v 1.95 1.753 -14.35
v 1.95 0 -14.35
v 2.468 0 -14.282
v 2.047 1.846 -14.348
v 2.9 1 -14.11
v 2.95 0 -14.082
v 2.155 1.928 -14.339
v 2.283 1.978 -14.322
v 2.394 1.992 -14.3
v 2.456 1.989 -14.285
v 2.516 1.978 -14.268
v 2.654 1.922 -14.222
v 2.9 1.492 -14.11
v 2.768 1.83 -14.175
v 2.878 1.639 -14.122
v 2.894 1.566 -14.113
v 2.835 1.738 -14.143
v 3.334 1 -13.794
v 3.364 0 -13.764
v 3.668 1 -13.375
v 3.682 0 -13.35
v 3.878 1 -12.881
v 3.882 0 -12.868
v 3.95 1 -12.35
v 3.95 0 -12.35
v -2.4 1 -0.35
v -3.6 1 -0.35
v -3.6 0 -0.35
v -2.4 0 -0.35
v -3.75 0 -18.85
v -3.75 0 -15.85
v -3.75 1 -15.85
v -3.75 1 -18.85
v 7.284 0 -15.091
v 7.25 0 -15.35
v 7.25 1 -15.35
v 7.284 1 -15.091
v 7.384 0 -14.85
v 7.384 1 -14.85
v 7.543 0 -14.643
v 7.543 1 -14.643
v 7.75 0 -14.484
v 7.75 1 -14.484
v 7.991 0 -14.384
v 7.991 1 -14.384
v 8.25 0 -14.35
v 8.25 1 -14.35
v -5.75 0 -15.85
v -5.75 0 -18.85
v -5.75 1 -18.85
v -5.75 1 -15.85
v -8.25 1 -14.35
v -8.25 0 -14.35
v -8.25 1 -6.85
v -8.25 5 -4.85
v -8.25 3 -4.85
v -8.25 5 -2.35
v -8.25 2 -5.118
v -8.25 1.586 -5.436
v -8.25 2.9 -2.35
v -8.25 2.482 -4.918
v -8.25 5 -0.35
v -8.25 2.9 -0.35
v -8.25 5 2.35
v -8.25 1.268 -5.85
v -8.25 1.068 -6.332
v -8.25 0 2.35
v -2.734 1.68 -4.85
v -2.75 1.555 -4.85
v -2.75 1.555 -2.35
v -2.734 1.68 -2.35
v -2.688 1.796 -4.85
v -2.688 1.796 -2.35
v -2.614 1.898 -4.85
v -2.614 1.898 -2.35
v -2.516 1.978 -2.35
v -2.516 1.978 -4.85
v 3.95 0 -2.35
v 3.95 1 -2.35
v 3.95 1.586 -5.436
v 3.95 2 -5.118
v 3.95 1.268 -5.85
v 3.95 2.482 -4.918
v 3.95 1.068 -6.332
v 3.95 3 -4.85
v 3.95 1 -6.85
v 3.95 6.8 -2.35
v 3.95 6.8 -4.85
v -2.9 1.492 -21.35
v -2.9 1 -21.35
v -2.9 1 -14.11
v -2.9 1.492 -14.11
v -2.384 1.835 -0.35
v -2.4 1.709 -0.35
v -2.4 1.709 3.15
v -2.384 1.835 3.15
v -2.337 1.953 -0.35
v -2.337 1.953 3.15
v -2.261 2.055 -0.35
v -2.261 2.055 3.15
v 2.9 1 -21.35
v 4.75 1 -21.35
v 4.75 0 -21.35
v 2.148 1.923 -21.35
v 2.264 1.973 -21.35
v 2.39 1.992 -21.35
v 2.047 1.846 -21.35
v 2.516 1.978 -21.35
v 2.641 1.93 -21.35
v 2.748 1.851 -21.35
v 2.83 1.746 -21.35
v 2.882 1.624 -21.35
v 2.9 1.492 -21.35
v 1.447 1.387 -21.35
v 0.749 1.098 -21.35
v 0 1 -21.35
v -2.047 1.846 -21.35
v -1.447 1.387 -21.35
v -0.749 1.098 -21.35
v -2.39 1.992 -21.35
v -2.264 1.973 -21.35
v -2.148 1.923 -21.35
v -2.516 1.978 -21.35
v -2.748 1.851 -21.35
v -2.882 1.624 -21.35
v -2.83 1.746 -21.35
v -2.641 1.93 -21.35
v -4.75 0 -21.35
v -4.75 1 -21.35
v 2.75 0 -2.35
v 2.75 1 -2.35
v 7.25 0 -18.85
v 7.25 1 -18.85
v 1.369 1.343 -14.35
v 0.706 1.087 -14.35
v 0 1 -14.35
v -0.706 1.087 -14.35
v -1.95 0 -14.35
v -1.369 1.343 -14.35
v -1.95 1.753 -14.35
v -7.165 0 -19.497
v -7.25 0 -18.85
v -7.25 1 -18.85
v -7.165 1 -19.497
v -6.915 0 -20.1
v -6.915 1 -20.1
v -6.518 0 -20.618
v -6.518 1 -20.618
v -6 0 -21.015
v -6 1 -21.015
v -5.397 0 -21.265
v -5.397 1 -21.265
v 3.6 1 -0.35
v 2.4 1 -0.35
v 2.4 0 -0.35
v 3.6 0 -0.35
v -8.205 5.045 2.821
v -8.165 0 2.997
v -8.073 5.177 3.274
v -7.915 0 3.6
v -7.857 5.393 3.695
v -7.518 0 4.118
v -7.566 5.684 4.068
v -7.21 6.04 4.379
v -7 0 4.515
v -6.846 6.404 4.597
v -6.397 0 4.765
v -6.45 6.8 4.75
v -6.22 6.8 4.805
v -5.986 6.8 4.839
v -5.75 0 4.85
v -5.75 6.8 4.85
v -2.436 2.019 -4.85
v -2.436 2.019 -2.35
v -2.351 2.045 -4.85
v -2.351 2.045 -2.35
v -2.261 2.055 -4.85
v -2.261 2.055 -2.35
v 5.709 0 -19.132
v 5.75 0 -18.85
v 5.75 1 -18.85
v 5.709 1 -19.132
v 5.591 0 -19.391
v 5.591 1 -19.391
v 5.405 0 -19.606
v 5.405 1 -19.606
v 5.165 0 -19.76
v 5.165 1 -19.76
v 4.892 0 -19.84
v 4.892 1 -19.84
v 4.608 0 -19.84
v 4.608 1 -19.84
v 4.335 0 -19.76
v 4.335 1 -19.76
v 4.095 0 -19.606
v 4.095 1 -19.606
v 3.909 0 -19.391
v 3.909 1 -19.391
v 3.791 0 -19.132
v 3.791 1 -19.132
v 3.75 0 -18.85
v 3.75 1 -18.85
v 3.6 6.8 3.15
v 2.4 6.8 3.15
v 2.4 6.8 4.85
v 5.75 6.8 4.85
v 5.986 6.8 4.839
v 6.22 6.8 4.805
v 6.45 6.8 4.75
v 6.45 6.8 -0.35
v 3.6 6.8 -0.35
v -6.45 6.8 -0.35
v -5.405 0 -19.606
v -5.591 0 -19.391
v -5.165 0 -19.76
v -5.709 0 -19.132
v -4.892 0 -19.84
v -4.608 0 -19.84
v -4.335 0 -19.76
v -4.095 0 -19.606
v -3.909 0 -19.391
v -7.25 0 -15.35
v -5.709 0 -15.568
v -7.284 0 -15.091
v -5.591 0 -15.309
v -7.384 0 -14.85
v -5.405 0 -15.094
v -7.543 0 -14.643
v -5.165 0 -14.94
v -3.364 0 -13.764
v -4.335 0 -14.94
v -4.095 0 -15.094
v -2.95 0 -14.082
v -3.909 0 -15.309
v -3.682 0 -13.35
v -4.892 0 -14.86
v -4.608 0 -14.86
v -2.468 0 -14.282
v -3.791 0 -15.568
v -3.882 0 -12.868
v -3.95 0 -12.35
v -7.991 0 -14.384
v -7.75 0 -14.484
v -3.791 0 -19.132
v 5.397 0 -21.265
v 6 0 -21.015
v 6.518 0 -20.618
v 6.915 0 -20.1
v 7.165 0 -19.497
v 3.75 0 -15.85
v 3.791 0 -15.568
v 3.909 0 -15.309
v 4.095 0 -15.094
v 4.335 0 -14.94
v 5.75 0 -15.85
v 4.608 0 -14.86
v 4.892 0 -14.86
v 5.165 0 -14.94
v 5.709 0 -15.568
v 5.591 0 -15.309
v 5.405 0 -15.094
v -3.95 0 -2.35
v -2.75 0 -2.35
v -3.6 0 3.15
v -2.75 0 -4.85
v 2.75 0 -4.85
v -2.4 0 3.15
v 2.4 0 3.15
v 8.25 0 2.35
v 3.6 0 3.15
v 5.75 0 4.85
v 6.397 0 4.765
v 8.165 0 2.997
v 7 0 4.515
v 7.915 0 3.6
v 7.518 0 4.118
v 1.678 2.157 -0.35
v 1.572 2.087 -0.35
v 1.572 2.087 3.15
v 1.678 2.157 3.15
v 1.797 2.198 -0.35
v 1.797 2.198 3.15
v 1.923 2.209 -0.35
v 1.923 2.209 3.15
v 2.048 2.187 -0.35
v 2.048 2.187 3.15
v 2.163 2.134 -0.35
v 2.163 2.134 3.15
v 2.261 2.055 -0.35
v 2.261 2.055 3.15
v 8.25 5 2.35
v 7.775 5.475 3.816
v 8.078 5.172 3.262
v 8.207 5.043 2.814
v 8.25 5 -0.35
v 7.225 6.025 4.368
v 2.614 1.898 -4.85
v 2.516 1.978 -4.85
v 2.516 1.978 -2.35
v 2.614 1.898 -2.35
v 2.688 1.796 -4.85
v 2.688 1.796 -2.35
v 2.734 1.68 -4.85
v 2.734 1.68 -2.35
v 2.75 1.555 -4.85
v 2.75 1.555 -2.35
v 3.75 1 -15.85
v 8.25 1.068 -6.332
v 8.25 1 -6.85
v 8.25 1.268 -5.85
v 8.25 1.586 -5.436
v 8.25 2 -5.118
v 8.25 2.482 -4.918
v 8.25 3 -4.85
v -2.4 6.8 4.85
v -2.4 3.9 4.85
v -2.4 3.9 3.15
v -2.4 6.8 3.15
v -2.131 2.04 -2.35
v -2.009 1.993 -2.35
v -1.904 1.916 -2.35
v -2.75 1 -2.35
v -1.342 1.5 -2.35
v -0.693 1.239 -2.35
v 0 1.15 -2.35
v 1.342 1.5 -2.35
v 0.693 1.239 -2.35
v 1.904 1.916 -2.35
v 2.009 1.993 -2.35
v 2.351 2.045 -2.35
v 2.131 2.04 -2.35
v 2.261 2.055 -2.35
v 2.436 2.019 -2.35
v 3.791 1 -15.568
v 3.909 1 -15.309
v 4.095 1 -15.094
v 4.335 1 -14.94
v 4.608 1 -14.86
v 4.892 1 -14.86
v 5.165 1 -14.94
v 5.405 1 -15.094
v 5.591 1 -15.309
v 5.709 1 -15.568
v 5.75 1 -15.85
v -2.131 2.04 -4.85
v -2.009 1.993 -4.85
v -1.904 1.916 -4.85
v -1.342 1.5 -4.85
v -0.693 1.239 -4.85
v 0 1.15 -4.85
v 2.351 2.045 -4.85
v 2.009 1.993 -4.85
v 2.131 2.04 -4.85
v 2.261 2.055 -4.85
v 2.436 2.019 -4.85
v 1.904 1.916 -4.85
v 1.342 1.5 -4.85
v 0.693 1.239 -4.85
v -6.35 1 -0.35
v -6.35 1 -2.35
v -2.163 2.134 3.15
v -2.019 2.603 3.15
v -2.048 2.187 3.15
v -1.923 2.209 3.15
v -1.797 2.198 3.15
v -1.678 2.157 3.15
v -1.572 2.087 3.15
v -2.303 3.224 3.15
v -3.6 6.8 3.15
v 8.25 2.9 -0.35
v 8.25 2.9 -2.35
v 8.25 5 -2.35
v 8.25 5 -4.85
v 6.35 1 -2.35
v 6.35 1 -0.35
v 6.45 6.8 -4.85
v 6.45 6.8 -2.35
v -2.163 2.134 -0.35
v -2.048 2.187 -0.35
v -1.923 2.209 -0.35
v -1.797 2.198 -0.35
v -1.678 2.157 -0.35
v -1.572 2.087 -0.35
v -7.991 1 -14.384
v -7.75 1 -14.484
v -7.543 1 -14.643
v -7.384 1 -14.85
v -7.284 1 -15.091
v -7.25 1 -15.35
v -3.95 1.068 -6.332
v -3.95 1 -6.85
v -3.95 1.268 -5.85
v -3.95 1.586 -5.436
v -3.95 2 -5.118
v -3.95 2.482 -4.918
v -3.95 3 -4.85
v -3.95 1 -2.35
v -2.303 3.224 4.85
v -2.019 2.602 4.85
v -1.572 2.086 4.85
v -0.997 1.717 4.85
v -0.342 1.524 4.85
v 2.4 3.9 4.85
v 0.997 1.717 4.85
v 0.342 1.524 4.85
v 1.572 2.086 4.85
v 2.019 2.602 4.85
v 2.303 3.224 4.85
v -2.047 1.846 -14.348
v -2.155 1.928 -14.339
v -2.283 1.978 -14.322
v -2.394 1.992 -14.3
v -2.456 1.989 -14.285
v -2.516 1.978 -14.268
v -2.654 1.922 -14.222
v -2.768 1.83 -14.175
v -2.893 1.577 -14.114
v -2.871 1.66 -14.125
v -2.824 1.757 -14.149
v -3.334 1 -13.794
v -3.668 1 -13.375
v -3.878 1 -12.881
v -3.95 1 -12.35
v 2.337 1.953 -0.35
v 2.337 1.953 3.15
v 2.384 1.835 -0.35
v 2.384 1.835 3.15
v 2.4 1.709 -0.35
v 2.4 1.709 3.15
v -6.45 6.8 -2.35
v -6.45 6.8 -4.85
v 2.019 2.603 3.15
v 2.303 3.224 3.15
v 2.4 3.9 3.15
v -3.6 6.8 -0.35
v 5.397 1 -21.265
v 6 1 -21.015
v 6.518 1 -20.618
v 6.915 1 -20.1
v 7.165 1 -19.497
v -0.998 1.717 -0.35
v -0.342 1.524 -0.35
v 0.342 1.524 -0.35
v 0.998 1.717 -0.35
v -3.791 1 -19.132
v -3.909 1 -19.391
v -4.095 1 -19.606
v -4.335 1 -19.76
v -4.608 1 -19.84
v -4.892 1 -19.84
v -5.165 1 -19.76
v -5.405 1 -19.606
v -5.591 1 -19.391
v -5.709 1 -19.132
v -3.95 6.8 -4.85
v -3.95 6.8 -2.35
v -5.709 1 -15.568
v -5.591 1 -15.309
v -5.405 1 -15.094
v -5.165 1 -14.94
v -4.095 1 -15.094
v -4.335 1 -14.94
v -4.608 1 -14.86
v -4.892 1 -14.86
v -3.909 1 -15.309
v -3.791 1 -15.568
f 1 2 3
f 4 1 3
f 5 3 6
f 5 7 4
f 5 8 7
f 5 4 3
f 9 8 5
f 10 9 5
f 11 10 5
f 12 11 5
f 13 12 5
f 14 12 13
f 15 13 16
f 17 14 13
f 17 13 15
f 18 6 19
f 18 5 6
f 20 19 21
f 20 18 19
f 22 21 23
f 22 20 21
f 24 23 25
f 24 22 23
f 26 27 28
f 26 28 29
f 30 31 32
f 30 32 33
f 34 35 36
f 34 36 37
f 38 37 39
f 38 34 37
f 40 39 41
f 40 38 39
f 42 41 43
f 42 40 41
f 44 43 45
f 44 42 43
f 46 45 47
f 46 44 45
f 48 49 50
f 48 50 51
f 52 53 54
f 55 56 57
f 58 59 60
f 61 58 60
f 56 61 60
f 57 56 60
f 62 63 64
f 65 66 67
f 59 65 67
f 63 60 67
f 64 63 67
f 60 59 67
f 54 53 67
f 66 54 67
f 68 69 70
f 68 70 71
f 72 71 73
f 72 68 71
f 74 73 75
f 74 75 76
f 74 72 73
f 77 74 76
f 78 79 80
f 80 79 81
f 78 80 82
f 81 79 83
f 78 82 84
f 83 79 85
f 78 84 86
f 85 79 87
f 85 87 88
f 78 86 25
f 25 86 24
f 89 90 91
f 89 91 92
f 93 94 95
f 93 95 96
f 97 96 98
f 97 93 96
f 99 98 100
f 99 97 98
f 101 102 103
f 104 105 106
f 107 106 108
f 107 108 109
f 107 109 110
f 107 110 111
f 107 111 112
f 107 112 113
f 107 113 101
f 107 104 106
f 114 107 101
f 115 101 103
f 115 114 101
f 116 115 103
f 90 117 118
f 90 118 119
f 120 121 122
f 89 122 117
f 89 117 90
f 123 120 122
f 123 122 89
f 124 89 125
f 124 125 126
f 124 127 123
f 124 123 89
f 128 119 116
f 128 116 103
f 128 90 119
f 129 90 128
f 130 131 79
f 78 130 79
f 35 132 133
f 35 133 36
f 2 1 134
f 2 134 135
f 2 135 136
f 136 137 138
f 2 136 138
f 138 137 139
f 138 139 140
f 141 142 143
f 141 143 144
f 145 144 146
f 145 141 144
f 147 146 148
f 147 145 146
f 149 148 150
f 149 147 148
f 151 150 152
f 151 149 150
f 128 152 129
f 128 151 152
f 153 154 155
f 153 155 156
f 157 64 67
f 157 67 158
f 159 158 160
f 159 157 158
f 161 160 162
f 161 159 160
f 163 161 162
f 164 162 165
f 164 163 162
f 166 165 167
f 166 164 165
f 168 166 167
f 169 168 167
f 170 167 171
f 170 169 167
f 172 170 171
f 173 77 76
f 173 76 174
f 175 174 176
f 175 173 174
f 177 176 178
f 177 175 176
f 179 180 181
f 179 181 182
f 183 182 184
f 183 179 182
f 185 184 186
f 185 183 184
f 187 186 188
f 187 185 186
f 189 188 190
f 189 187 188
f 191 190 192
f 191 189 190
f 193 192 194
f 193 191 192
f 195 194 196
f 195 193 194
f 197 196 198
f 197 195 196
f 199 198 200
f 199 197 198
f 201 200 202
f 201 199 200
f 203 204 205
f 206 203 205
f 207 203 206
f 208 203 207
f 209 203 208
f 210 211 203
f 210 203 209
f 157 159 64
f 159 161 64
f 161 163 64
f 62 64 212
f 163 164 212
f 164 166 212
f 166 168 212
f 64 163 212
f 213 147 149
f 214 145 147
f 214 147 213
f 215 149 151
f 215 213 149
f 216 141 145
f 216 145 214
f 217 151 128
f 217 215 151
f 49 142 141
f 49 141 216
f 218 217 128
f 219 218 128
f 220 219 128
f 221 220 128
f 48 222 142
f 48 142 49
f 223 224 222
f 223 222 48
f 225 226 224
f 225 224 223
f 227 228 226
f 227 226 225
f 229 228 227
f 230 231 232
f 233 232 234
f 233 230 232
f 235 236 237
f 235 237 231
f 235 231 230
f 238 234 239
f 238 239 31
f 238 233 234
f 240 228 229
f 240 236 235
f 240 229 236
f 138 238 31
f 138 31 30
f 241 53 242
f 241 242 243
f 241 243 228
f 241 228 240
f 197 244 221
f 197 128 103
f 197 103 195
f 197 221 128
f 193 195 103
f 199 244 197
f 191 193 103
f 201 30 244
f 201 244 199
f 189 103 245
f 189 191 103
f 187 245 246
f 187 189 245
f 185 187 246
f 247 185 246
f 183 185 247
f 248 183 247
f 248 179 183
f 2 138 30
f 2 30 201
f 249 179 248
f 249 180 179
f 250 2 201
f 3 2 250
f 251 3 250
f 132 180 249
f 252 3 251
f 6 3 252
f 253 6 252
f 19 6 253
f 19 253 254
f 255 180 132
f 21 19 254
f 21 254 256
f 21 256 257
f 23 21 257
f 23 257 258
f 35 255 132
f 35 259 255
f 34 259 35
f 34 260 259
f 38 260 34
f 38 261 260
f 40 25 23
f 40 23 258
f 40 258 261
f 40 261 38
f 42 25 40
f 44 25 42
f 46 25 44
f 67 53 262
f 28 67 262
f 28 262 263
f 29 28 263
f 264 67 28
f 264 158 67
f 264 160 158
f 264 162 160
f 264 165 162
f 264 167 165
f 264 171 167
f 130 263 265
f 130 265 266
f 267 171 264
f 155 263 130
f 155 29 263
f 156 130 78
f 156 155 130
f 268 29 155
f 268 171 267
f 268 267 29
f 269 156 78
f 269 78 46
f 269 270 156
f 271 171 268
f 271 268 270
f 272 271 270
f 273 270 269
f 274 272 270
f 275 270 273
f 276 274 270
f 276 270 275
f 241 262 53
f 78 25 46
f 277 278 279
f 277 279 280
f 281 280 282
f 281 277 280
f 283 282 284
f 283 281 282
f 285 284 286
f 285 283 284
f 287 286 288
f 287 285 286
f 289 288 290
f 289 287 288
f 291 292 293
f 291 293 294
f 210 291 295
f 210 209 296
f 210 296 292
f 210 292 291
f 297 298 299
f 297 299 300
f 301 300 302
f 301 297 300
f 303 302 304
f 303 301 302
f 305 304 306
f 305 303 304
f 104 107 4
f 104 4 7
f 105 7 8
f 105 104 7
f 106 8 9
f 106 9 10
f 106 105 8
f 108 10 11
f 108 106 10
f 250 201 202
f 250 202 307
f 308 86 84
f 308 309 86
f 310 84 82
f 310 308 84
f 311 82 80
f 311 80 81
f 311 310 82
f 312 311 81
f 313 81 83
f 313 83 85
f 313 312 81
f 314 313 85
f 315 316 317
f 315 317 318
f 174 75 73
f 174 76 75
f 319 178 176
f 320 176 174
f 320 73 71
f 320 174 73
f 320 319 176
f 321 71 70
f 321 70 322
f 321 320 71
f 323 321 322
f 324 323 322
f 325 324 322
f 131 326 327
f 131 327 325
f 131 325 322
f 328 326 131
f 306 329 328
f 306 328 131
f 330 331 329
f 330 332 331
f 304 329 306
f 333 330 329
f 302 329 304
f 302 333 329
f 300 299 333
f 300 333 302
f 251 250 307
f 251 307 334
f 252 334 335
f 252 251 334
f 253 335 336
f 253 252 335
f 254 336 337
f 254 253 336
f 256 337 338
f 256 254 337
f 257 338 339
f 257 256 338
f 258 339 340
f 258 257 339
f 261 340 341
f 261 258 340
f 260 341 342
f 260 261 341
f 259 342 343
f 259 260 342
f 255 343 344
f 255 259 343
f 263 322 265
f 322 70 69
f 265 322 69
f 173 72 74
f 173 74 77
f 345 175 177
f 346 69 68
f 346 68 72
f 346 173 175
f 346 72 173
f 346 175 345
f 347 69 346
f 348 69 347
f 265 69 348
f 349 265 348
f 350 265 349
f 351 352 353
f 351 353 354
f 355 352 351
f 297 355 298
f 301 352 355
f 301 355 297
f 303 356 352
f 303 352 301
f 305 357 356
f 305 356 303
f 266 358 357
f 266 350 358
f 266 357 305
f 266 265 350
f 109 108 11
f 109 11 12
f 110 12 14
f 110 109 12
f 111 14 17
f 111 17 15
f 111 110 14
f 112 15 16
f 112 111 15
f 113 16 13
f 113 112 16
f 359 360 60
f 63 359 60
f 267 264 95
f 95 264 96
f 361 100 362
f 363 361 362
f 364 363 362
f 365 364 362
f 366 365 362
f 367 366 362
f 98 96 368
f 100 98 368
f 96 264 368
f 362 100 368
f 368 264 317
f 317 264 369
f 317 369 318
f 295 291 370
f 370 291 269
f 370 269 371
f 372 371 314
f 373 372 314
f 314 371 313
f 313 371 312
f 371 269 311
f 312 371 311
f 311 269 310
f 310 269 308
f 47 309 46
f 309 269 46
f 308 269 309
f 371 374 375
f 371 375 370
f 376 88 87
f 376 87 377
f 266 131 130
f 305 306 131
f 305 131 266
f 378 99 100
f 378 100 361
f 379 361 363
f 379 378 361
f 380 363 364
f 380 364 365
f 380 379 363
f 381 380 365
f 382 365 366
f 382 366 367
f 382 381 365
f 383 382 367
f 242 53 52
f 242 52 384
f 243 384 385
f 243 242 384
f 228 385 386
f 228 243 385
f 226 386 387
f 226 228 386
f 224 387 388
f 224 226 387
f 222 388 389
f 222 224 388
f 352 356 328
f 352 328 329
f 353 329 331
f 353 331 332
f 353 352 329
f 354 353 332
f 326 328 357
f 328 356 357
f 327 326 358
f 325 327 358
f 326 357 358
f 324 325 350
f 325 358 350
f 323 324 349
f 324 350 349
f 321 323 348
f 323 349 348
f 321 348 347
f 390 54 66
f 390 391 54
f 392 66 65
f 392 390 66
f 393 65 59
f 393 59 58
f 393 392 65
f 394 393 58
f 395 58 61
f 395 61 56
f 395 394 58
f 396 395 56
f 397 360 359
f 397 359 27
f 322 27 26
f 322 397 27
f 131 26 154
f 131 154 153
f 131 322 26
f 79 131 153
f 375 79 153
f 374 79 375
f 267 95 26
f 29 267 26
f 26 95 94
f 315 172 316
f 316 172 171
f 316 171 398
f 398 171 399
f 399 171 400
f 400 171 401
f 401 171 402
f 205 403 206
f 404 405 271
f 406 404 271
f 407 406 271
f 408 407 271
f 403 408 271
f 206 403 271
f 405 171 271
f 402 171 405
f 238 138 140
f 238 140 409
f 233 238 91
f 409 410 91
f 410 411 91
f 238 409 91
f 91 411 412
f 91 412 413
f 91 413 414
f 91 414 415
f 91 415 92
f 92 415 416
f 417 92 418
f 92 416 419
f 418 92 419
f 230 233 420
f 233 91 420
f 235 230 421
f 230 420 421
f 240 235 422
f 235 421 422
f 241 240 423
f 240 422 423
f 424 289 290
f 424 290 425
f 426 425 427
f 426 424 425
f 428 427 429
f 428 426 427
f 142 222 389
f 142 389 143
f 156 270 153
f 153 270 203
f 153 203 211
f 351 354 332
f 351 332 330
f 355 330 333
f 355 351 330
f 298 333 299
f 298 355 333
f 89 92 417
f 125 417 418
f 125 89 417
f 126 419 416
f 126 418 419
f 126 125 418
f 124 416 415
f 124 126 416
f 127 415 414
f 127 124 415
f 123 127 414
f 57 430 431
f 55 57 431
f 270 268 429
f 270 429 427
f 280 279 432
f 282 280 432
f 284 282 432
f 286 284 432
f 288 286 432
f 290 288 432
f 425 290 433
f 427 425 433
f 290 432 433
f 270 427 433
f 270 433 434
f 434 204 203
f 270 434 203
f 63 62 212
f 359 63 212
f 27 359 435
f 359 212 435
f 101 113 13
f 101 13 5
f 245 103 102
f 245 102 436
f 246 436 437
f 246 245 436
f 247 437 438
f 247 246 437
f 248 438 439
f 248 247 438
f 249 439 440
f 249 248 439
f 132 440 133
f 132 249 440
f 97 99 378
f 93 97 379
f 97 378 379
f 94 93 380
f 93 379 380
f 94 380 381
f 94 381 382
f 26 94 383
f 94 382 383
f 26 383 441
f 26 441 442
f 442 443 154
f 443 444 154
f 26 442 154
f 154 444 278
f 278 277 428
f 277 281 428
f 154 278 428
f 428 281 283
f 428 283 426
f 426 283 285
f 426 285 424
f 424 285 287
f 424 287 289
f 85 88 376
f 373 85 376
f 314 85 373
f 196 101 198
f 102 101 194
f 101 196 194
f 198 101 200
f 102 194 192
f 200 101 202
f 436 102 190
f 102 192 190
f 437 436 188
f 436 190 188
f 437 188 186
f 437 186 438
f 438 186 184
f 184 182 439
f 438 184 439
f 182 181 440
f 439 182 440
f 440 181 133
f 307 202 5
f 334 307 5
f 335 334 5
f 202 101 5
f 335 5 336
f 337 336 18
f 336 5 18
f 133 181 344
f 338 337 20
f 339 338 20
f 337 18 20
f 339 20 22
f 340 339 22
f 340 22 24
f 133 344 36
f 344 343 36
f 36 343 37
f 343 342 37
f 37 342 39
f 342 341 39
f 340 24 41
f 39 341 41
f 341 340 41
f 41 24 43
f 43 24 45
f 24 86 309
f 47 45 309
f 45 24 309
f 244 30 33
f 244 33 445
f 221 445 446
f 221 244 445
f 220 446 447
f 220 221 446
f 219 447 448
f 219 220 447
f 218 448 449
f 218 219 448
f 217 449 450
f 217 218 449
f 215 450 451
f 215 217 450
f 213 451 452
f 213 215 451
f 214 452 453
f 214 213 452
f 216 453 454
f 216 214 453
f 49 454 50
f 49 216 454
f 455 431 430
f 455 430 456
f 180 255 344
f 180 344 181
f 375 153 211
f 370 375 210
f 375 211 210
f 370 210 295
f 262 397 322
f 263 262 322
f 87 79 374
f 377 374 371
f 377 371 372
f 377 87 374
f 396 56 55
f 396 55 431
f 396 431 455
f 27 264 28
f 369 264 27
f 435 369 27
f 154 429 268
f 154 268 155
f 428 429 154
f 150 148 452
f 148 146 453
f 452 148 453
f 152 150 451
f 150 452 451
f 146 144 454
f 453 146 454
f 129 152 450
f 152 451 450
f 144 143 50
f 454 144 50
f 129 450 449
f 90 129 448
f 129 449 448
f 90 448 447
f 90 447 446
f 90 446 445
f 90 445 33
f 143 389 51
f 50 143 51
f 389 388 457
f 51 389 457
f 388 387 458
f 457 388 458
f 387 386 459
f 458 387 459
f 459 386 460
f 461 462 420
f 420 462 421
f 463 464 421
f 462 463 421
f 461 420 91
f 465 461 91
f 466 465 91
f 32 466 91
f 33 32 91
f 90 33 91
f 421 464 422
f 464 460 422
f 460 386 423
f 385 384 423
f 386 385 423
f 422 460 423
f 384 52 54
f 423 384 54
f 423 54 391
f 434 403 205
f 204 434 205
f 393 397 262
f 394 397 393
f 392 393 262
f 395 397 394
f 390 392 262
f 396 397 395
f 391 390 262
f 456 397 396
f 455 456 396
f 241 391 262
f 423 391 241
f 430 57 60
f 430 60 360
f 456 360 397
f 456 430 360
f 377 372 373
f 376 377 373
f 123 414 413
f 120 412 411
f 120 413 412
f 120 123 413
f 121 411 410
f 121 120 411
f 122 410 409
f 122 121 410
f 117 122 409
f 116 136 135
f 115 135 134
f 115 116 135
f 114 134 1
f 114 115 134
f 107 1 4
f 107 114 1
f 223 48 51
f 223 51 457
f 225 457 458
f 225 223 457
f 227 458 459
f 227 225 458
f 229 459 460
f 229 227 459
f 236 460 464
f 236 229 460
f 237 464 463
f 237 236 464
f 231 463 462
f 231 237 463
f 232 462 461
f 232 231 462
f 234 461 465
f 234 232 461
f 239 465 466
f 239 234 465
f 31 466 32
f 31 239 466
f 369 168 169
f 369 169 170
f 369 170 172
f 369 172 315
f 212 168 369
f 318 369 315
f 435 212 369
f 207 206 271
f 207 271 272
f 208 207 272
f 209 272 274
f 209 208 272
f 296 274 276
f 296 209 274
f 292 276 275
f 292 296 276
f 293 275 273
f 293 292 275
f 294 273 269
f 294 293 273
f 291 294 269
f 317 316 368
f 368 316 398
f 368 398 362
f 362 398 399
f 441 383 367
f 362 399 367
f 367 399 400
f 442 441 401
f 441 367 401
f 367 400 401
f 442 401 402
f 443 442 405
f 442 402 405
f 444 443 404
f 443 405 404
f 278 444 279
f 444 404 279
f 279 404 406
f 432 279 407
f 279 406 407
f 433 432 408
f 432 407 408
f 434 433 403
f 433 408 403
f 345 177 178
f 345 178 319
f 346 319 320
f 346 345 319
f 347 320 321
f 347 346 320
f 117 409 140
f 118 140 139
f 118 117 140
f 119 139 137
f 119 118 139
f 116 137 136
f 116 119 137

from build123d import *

# Parameters (mm, degrees)
SKETCH1_W           = 16.5
SKETCH1_H           = 9.7
BOSS_EXTRUDE1_DEPTH = 6.8
SKETCH2_W           = 16.5
SKETCH2_H           = 2
CUT_EXTRUDE1_DEPTH  = 5.8
CUT_EXTRUDE2_REACH  = 16.436
SKETCH3_R           = 2.75
CUT_EXTRUDE3_REACH  = 16.436
SKETCH4_R           = 2.4
SKETCH4_W           = 4.8
SKETCH4_H           = 2.9
SKETCH5_W           = 1.2
SKETCH5_H           = 2.5
SKETCH5_H_2         = 3.5
CUT_EXTRUDE4_DEPTH  = 12.739889267
BOSS_EXTRUDE2_DEPTH = 2
CHAMFER1_SIZE       = 1.8
FILLET4_R           = 2.5
SKETCH8_W           = 2.5
SKETCH8_H           = 9.5
SKETCH8_W_2         = 1.8
BOSS_EXTRUDE3_DEPTH = 1
BOSS_EXTRUDE5_DEPTH = 7
FILLET1_START       = -22
FILLET1_DEPTH       = 25.15
FILLET1_2_DEPTH     = 7.65
FILLET1_START_2     = -14.35
FILLET1_3_DEPTH     = 12
FILLET1_START_3     = -0.35
FILLET1_4_DEPTH     = 3.5
FILLET5_R           = 2


with BuildPart() as part:
    # Sketch1 → Boss-Extrude1 (new body)
    with BuildSketch(Plane(origin=(0, 0, 0), x_dir=(1, 0, 0), z_dir=(0, 1, 0))):
        Rectangle(SKETCH1_W, SKETCH1_H)
    extrude(amount=BOSS_EXTRUDE1_DEPTH)

    # Sketch2 → Cut-Extrude1 (cut)
    with BuildSketch(Plane(origin=(0, 6.8, 0), x_dir=(1, 0, 0), z_dir=(0, 1, 0))):
        with Locations((0, 1.35)):
            Rectangle(SKETCH2_W, SKETCH2_H)
    extrude(amount=-CUT_EXTRUDE1_DEPTH, mode=Mode.SUBTRACT)

    # Sketch3 → Cut-Extrude2 (cut, up to next)
    with BuildSketch(Plane(origin=(0, 0, -4.85), x_dir=(-1, 0, 0), z_dir=(0, 0, -1)), mode=Mode.PRIVATE) as cut_extrude2_sk1:
        with Locations((0, 3.9)):
            Circle(SKETCH3_R)
    cut_extrude2_tool1 = extrude(cut_extrude2_sk1.sketch, amount=-CUT_EXTRUDE2_REACH, mode=Mode.PRIVATE) & part.part
    # Sketch3 → Cut-Extrude2 (cut, up to next)
    with BuildSketch(Plane(origin=(0, 0, -4.85), x_dir=(-1, 0, 0), z_dir=(0, 0, -1)), mode=Mode.PRIVATE) as cut_extrude2_sk2:
        with BuildLine():
            Line((-2.75, 6.8), (-2.75, 3.9))
            ThreePointArc((-2.75, 3.9), (0, 6.65), (2.75, 3.9))
            Line((2.75, 3.9), (2.75, 6.8))
            Line((2.75, 6.8), (-2.75, 6.8))
        make_face()
    cut_extrude2_tool2 = extrude(cut_extrude2_sk2.sketch, amount=-CUT_EXTRUDE2_REACH, mode=Mode.PRIVATE) & part.part
    add(cut_extrude2_tool1.solids().sort_by_distance((0, 3.9, -4.85))[0], mode=Mode.SUBTRACT)
    add(cut_extrude2_tool2.solids().sort_by_distance((2.687823, 5.35, -4.85))[0], mode=Mode.SUBTRACT)

    # Sketch4 → Cut-Extrude3 (cut, up to next)
    with BuildSketch(Plane.XY.offset(4.85), mode=Mode.PRIVATE) as cut_extrude3_sk1:
        with Locations((0, 3.9)):
            Circle(SKETCH4_R)
    cut_extrude3_tool1 = extrude(cut_extrude3_sk1.sketch, amount=-CUT_EXTRUDE3_REACH, mode=Mode.PRIVATE) & part.part
    # Sketch4 → Cut-Extrude3 (cut, up to next)
    with BuildSketch(Plane.XY.offset(4.85), mode=Mode.PRIVATE) as cut_extrude3_sk2:
        with Locations((0, 5.35)):
            Rectangle(SKETCH4_W, SKETCH4_H)
    cut_extrude3_tool2 = extrude(cut_extrude3_sk2.sketch, amount=-CUT_EXTRUDE3_REACH, mode=Mode.PRIVATE) & part.part
    add(cut_extrude3_tool1.solids().sort_by_distance((0, 3.9, 4.85))[0], mode=Mode.SUBTRACT)
    add(cut_extrude3_tool2.solids().sort_by_distance((0, 5.35, 4.85))[0], mode=Mode.SUBTRACT)

    # Sketch5 → Cut-Extrude4 (cut, through all)
    with BuildSketch(Plane(origin=(0, 6.8, 0), x_dir=(1, 0, 0), z_dir=(0, 1, 0))):
        with Locations((-3.35, 3.6)):
            Rectangle(SKETCH5_W, SKETCH5_H)
        with Locations((3.35, 3.6)):
            Rectangle(SKETCH5_W, SKETCH5_H)
        with Locations((-3, -1.4)):
            Rectangle(SKETCH5_W, SKETCH5_H_2)
        with Locations((3, -1.4)):
            Rectangle(SKETCH5_W, SKETCH5_H_2)
    extrude(amount=-CUT_EXTRUDE4_DEPTH, mode=Mode.SUBTRACT)

    # Sketch7 → Boss-Extrude2 (add)
    with BuildSketch(Plane.XY.offset(-2.35)):
        Polygon((-6.35, 1), (-8.25, 2.9), (-8.25, 1), align=None)
        Polygon((8.25, 2.9), (8.25, 1), (6.35, 1), align=None)
    extrude(amount=BOSS_EXTRUDE2_DEPTH)

    # Chamfer1
    chamfer1_edges = [part.edges().sort_by_distance(p)[0] for p in [
        (-8.25, 6.8, -3.6),
        (8.25, 6.8, -3.6),
        (-8.25, 6.8, 2.25),
        (8.25, 6.8, 2.25),
    ]]
    chamfer(chamfer1_edges, length=CHAMFER1_SIZE)

    # Fillet4
    fillet4_edges = [part.edges().sort_by_distance(p)[0] for p in [
        (8.25, 2.5, 4.85),
        (-8.25, 2.5, 4.85),
    ]]
    fillet(fillet4_edges, radius=FILLET4_R)

    # Sketch8 → Boss-Extrude3 (add)
    # profile 1 of 7: a face of its own
    with BuildSketch(Plane.XZ):
        with Locations((-7, -9.6)):
            Rectangle(SKETCH8_W, SKETCH8_H)
    # profile 2 of 7: a face of its own
    with BuildSketch(Plane.XZ):
        with Locations((7, -9.6)):
            Rectangle(SKETCH8_W, SKETCH8_H)
    # profile 3 of 7: a face of its own
    with BuildSketch(Plane.XZ):
        with BuildLine():
            Line((8.25, -14.35), (5.75, -14.35))
            Line((5.75, -14.35), (5.75, -15.85))
            Line((5.75, -15.85), (7.25, -15.85))
            Line((7.25, -15.85), (7.25, -15.35))
            ThreePointArc((7.25, -15.35), (7.542893219, -14.642893219), (8.25, -14.35))
        make_face()
    # profile 4 of 7: a face of its own
    with BuildSketch(Plane.XZ):
        with BuildLine():
            Line((-7.25, -15.85), (-5.75, -15.85))
            Line((-5.75, -15.85), (-5.75, -14.35))
            Line((-5.75, -14.35), (-8.25, -14.35))
            ThreePointArc((-8.25, -14.35), (-7.542893219, -14.642893219), (-7.25, -15.35))
            Line((-7.25, -15.35), (-7.25, -15.85))
        make_face()
    # profile 5 of 7: a face of its own
    with BuildSketch(Plane.XZ):
        with BuildLine():
            Line((-5.75, -14.35), (-5.75, -15.85))
            Line((-5.75, -15.85), (-7.25, -15.85))
            Line((-7.25, -15.85), (-7.25, -18.85))
            ThreePointArc((-7.25, -18.85), (-6.517766953, -20.617766953), (-4.75, -21.35))
            Line((-4.75, -21.35), (4.75, -21.35))
            ThreePointArc((4.75, -21.35), (6.517766953, -20.617766953), (7.25, -18.85))
            Line((7.25, -18.85), (7.25, -15.85))
            Line((7.25, -15.85), (5.75, -15.85))
            Line((5.75, -15.85), (5.75, -14.35))
            Line((5.75, -14.35), (3.95, -14.35))
            Line((3.95, -14.35), (-3.95, -14.35))
            Line((-3.95, -14.35), (-5.75, -14.35))
        make_face()
        with BuildLine():
            ThreePointArc((-3.75, -18.85), (-4.75, -19.85), (-5.75, -18.85))
            Line((-5.75, -18.85), (-5.75, -15.85))
            ThreePointArc((-5.75, -15.85), (-4.75, -14.85), (-3.75, -15.85))
            Line((-3.75, -15.85), (-3.75, -18.85))
        make_face(mode=Mode.SUBTRACT)
        with BuildLine():
            ThreePointArc((3.75, -15.85), (4.75, -14.85), (5.75, -15.85))
            Line((5.75, -15.85), (5.75, -18.85))
            ThreePointArc((5.75, -18.85), (4.75, -19.85), (3.75, -18.85))
            Line((3.75, -18.85), (3.75, -15.85))
        make_face(mode=Mode.SUBTRACT)
    # profile 6 of 7: a face of its own
    with BuildSketch(Plane.XZ):
        with Locations((-4.85, -9.6)):
            Rectangle(SKETCH8_W_2, SKETCH8_H)
    # profile 7 of 7: a face of its own
    with BuildSketch(Plane.XZ):
        with Locations((4.85, -9.6)):
            Rectangle(SKETCH8_W_2, SKETCH8_H)
    extrude(amount=-BOSS_EXTRUDE3_DEPTH)

    # Sketch11 → Boss-Extrude5 (add)
    with BuildSketch(Plane(origin=(0, 0, -21.35), x_dir=(-1, 0, 0), z_dir=(0, 0, -1))):
        with BuildLine():
            Line((2.9, 1), (2.9, 3.9))
            ThreePointArc((2.9, 3.9), (2.050609665, 1.849390335), (0, 1))
            Line((0, 1), (2.9, 1))
        make_face()
        with BuildLine():
            ThreePointArc((0, 1), (-2.050609665, 1.849390335), (-2.9, 3.9))
            Line((-2.9, 3.9), (-2.9, 1))
            Line((-2.9, 1), (0, 1))
        make_face()
    extrude(amount=-BOSS_EXTRUDE5_DEPTH)

    # Fillet1: read off the stored shape, not the designer's step
    # Fillet1 outline → Fillet1 (cut)
    with BuildSketch(Plane.XY.offset(FILLET1_START)):
        with BuildLine():
            Line((-2.9, 3.9), (-2.9, 1.491681084))
            ThreePointArc((-2.9, 1.491681084), (-2.792530688, 1.801390075), (-2.516321365, 1.977962217))
            ThreePointArc((-2.516321365, 1.977962217), (-2.394047935, 2.033592906), (-2.261376801, 2.054662672))
            ThreePointArc((-2.261376801, 2.054662672), (-1.923333419, 2.208565025), (-1.572413793, 2.086849465))
            ThreePointArc((-1.572413793, 2.086849465), (-2.183322366, 2.903454242), (-2.4, 3.9))
            Line((-2.4, 3.9), (-2.4, 2.557427842))
            ThreePointArc((-2.4, 2.557427842), (-2.661061818, 3.206278154), (-2.75, 3.9))
            Line((-2.75, 3.9), (-2.75, 2.979402368))
            ThreePointArc((-2.75, 2.979402368), (-2.862254356, 3.433631047), (-2.9, 3.9))
        make_face()
        with BuildLine():
            ThreePointArc((2.4, 3.9), (2.183322366, 2.903454242), (1.572413793, 2.086849465))
            ThreePointArc((1.572413793, 2.086849465), (1.923333419, 2.208565025), (2.261376801, 2.054662672))
            ThreePointArc((2.261376801, 2.054662672), (2.394047935, 2.033592906), (2.516321365, 1.977962217))
            ThreePointArc((2.516321365, 1.977962217), (2.792530688, 1.801390075), (2.9, 1.491681084))
            Line((2.9, 1.491681084), (2.9, 3.9))
            ThreePointArc((2.9, 3.9), (2.862254356, 3.433631047), (2.75, 2.979402368))
            Line((2.75, 2.979402368), (2.75, 3.9))
            ThreePointArc((2.75, 3.9), (2.661061818, 3.206278154), (2.4, 2.557427842))
            Line((2.4, 2.557427842), (2.4, 3.9))
        make_face()
    extrude(amount=FILLET1_DEPTH, mode=Mode.SUBTRACT)

    # Fillet1 2 outline → Fillet1 2 (cut)
    with BuildSketch(Plane.XY.offset(FILLET1_START)):
        with BuildLine():
            ThreePointArc((-2.516321365, 1.977962217), (-2.264497484, 1.97297005), (-2.047058824, 1.845845631))
            ThreePointArc((-2.047058824, 1.845845631), (-2.150447744, 1.954344712), (-2.248093276, 2.068040224))
            ThreePointArc((-2.248093276, 2.068040224), (-2.254798094, 2.06141406), (-2.261376801, 2.054662672))
            ThreePointArc((-2.261376801, 2.054662672), (-2.394047935, 2.033592906), (-2.516321365, 1.977962217))
        make_face()
        with BuildLine():
            ThreePointArc((2.047058824, 1.845845631), (2.264497484, 1.97297005), (2.516321365, 1.977962217))
            ThreePointArc((2.516321365, 1.977962217), (2.394047935, 2.033592906), (2.261376801, 2.054662672))
            ThreePointArc((2.261376801, 2.054662672), (2.254798094, 2.06141406), (2.248093276, 2.068040224))
            ThreePointArc((2.248093276, 2.068040224), (2.150447744, 1.954344712), (2.047058824, 1.845845631))
        make_face()
    extrude(amount=FILLET1_2_DEPTH, mode=Mode.SUBTRACT)

    # Fillet1 3 outline → Fillet1 3 (cut)
    with BuildSketch(Plane.XY.offset(FILLET1_START_2)):
        with BuildLine():
            ThreePointArc((-2.516321365, 1.977962217), (-2.641945637, 1.929245147), (-2.75, 1.848752506))
            Line((-2.75, 1.848752506), (-2.75, 1.55479212))
            ThreePointArc((-2.75, 1.55479212), (-2.687698916, 1.796493711), (-2.516321365, 1.977962217))
        make_face()
        with BuildLine():
            ThreePointArc((-2.261376801, 2.054662672), (-2.068743309, 2.020781403), (-1.903846154, 1.915593332))
            ThreePointArc((-1.903846154, 1.915593332), (-2.01831936, 2.032143753), (-2.125669903, 2.155285851))
            ThreePointArc((-2.125669903, 2.155285851), (-2.197803986, 2.1107474), (-2.261376801, 2.054662672))
        make_face()
        with BuildLine():
            ThreePointArc((2.261376801, 2.054662672), (2.197803986, 2.1107474), (2.125669903, 2.155285851))
            ThreePointArc((2.125669903, 2.155285851), (2.01831936, 2.032143753), (1.903846154, 1.915593332))
            ThreePointArc((1.903846154, 1.915593332), (2.068743309, 2.020781403), (2.261376801, 2.054662672))
        make_face()
        with BuildLine():
            ThreePointArc((2.75, 1.848752506), (2.641945637, 1.929245147), (2.516321365, 1.977962217))
            ThreePointArc((2.516321365, 1.977962217), (2.687698916, 1.796493711), (2.75, 1.55479212))
            Line((2.75, 1.55479212), (2.75, 1.848752506))
        make_face()
    extrude(amount=FILLET1_3_DEPTH, mode=Mode.SUBTRACT)

    # Fillet1 4 outline → Fillet1 4 (cut)
    with BuildSketch(Plane.XY.offset(FILLET1_START_3)):
        with BuildLine():
            Line((-2.4, 2.031761721), (-2.4, 1.70910977))
            ThreePointArc((-2.4, 1.70910977), (-2.364051937, 1.895270453), (-2.261376801, 2.054662672))
            ThreePointArc((-2.261376801, 2.054662672), (-2.331496818, 2.048105681), (-2.4, 2.031761721))
        make_face()
        with BuildLine():
            ThreePointArc((2.261376801, 2.054662672), (2.364051937, 1.895270453), (2.4, 1.70910977))
            Line((2.4, 1.70910977), (2.4, 2.031761721))
            ThreePointArc((2.4, 2.031761721), (2.331496818, 2.048105681), (2.261376801, 2.054662672))
        make_face()
    extrude(amount=FILLET1_4_DEPTH, mode=Mode.SUBTRACT)

    # Fillet5
    fillet5_edges = [part.edges().sort_by_distance(p)[0] for p in [
        (-3.95, 0.5, -14.35),
        (3.95, 0.5, -14.35),
        (6.1, 1, -4.85),
        (-6.1, 1, -4.85),
    ]]
    fillet(fillet5_edges, radius=FILLET5_R)


solid = part.part
